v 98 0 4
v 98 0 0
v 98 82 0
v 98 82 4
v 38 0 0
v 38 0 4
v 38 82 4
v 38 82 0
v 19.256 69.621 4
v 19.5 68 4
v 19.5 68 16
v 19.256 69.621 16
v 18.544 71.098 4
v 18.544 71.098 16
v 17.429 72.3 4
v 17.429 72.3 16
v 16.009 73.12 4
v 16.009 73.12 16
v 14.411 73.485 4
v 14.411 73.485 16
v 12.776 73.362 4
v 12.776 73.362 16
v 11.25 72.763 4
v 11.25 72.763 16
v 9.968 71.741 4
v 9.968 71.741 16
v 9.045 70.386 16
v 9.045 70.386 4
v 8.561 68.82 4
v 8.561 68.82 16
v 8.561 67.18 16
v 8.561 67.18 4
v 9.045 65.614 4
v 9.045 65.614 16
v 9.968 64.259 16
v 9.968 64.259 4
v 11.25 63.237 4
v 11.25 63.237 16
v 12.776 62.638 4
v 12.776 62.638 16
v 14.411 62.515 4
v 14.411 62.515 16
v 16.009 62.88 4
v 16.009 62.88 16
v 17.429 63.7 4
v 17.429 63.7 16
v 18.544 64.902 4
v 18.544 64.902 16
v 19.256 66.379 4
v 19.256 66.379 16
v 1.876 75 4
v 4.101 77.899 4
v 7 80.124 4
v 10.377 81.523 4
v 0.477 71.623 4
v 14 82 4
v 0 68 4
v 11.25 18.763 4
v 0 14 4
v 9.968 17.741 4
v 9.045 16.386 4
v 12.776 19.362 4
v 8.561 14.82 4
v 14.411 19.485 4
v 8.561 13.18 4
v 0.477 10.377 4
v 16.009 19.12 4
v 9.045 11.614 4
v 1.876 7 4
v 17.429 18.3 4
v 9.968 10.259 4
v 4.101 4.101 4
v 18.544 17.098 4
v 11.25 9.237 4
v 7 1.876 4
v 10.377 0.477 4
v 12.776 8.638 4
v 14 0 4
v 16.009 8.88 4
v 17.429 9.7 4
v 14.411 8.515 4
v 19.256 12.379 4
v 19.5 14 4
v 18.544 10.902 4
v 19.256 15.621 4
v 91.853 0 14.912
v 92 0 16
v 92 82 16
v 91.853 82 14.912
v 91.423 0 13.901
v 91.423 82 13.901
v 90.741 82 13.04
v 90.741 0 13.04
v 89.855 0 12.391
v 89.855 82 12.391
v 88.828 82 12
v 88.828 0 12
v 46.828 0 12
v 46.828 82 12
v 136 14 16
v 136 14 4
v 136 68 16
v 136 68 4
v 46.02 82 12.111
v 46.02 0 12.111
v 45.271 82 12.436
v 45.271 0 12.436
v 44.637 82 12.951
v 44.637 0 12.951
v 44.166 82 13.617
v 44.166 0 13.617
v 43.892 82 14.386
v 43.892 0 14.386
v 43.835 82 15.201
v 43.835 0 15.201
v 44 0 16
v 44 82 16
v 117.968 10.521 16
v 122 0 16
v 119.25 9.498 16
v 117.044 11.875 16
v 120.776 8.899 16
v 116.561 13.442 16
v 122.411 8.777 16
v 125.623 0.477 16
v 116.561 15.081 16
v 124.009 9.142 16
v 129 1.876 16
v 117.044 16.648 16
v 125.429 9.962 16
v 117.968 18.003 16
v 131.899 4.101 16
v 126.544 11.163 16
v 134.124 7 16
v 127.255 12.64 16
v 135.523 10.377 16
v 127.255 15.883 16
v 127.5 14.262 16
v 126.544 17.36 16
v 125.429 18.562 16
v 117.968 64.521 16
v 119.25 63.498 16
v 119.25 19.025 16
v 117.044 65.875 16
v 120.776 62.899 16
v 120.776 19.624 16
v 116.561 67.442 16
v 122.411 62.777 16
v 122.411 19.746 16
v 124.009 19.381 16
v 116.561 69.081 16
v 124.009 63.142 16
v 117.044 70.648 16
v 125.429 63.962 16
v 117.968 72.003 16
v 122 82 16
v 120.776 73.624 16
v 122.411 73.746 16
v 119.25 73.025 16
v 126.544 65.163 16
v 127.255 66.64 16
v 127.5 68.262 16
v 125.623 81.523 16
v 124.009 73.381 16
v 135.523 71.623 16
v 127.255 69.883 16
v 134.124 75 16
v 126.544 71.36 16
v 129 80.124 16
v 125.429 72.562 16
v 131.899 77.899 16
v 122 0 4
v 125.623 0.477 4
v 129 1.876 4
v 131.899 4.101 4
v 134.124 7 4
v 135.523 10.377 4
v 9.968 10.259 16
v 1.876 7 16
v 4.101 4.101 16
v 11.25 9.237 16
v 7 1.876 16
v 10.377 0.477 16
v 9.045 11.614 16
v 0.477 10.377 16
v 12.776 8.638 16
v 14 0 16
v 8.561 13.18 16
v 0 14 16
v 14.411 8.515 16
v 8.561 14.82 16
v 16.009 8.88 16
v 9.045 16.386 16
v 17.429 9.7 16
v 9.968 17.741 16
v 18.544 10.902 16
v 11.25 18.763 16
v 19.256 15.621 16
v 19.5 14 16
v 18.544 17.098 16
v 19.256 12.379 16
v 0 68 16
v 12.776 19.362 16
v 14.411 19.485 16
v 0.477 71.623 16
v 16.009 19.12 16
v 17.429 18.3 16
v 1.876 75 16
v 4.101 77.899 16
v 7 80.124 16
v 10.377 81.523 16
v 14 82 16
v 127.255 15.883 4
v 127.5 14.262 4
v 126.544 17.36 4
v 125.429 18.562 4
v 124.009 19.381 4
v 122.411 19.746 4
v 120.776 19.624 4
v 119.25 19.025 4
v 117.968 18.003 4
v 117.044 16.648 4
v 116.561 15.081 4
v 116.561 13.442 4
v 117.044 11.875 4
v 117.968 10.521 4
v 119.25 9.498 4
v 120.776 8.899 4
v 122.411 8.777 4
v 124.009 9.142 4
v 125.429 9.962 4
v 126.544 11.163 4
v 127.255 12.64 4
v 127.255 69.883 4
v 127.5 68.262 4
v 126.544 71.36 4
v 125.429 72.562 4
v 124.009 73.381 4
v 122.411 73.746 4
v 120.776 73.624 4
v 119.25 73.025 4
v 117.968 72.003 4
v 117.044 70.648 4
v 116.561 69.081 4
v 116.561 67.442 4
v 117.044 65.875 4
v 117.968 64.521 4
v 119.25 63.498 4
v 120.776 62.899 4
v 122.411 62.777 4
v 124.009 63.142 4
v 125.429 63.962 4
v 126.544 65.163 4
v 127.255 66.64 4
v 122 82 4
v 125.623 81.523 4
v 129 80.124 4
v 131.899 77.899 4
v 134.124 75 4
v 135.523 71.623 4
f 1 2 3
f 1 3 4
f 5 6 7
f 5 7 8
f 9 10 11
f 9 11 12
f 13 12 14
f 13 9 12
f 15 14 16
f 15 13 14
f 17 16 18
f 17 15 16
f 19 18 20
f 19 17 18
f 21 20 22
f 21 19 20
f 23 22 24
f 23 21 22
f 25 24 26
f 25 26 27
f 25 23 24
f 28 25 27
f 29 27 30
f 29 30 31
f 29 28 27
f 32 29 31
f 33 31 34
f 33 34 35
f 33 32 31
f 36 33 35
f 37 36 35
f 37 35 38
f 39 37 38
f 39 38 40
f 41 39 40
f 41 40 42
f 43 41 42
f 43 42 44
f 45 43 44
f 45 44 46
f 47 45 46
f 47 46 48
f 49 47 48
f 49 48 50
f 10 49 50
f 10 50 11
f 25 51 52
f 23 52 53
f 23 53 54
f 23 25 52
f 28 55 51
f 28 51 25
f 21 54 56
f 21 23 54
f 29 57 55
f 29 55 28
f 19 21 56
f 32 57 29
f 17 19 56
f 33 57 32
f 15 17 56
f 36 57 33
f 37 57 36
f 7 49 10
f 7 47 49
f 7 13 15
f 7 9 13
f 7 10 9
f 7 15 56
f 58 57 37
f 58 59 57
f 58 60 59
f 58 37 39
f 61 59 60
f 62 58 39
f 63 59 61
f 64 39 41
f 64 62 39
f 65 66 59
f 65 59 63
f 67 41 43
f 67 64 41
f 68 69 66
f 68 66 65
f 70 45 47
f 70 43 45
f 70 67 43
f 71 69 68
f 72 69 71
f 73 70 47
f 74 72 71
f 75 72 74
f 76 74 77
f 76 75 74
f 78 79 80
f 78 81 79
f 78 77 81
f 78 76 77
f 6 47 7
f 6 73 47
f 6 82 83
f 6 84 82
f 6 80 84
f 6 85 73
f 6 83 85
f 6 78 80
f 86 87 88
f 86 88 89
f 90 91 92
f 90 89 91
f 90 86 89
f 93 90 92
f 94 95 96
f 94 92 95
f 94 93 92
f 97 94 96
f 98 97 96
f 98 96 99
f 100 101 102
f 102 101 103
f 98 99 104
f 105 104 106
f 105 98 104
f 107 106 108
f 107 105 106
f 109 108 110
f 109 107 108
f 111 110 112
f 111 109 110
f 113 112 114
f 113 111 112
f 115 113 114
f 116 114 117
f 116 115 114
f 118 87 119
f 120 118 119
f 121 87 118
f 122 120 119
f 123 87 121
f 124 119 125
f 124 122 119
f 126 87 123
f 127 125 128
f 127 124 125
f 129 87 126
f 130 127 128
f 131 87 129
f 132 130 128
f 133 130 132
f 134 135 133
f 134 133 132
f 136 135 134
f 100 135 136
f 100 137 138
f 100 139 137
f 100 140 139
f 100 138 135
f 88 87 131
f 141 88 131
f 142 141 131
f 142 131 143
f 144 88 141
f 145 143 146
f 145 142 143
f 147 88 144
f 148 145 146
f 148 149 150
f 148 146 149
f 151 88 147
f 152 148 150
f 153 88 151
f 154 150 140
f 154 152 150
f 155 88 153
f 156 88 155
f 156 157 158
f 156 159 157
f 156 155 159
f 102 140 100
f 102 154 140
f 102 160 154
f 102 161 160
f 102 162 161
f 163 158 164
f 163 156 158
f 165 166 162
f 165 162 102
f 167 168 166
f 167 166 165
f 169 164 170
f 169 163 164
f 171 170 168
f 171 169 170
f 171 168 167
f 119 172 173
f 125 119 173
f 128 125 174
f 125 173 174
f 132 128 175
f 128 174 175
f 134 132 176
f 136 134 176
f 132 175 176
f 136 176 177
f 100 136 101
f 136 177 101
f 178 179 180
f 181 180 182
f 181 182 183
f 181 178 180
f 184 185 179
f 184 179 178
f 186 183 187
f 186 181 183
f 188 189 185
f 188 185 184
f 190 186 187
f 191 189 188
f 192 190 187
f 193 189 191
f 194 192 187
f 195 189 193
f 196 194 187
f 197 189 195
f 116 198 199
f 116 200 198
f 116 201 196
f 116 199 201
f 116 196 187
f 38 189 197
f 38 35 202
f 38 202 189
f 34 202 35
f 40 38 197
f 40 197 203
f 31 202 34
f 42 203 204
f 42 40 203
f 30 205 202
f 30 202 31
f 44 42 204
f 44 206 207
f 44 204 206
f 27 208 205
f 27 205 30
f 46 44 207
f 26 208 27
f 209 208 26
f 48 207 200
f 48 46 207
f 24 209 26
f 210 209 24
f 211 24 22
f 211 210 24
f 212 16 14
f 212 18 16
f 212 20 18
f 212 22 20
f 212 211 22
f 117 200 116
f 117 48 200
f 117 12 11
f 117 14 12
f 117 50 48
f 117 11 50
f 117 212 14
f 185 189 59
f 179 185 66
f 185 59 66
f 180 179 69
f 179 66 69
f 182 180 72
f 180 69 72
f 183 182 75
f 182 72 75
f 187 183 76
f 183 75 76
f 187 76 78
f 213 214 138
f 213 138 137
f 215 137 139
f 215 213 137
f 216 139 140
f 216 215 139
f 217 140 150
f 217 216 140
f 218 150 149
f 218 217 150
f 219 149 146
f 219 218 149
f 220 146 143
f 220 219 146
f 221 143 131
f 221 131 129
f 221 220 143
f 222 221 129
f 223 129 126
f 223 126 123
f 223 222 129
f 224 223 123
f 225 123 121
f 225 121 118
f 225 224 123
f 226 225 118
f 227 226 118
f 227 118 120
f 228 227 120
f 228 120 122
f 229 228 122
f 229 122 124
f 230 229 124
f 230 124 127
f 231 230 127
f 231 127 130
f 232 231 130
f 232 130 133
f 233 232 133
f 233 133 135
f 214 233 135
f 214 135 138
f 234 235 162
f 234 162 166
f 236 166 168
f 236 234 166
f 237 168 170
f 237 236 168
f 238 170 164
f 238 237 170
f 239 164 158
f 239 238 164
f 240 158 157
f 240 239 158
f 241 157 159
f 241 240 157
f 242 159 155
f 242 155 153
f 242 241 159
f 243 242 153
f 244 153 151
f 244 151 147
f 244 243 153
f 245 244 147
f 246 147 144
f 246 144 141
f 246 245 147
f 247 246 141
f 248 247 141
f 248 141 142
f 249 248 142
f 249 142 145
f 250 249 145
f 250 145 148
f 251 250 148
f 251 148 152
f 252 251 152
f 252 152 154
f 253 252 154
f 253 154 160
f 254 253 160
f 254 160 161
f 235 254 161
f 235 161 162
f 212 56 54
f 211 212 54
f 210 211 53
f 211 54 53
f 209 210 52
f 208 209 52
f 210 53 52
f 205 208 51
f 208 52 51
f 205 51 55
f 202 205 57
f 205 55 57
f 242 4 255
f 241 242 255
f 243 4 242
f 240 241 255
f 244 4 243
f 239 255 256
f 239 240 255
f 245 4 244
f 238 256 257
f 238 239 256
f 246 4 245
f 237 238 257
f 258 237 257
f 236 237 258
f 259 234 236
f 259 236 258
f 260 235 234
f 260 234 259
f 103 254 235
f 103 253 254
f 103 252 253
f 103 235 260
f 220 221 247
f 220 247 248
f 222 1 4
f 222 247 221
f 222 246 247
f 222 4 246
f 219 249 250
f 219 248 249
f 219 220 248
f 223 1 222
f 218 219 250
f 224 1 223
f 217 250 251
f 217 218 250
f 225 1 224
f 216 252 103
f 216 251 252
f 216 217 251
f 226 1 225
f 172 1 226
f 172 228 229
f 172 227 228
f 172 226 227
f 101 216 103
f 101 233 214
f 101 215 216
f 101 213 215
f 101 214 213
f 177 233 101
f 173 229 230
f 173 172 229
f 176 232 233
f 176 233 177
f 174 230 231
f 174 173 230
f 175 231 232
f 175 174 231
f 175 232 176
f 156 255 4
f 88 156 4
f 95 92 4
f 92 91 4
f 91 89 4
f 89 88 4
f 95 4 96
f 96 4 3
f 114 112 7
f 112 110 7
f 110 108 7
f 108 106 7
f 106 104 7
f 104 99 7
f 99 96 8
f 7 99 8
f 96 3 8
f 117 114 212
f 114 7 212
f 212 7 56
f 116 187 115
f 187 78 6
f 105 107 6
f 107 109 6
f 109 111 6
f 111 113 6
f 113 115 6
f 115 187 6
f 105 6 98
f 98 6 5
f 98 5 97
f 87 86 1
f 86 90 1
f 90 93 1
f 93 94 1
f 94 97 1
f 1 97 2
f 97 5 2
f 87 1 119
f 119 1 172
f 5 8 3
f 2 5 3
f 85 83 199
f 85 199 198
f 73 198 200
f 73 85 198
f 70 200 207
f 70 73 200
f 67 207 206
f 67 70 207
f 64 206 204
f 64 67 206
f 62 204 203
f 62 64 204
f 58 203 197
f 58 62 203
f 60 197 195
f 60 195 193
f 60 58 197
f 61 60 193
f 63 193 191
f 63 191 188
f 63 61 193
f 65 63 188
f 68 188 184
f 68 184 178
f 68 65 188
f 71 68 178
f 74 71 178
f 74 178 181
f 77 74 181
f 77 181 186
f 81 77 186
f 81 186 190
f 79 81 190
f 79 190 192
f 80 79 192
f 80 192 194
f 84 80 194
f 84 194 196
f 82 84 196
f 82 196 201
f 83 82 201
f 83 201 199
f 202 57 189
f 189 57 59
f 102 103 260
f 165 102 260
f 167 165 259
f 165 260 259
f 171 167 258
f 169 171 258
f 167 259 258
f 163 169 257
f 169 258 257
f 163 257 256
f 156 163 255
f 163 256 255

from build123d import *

# Parameters (mm, degrees)
F0_R     = 5.5
F0_W     = 48
F0_H     = 82
F1_DEPTH = 16
F3_DEPTH = 82.001


with BuildPart() as f1:
    # F0 (on Top) → F1 (new body)
    with BuildSketch(Plane.XY):
        with BuildLine():
            Line((0, 68), (0, 14))
            ThreePointArc((0, 14), (4.100505, 4.100505), (14, 0))
            Line((14, 0), (44, 0))
            Line((44, 0), (44, 82))
            Line((44, 82), (14, 82))
            ThreePointArc((14, 82), (4.100505, 77.899495), (0, 68))
        make_face()
        with Locations((14, 14)):
            Circle(F0_R, mode=Mode.SUBTRACT)
        with Locations((14, 68)):
            Circle(F0_R, mode=Mode.SUBTRACT)
        with Locations((68, 41)):
            Rectangle(F0_W, F0_H)
        with BuildLine():
            Line((92, 82), (92, 0))
            Line((92, 0), (122, 0))
            ThreePointArc((122, 0), (131.899495, 4.100505), (136, 14))
            Line((136, 14), (136, 68))
            ThreePointArc((136, 68), (131.899495, 77.899495), (122, 82))
            Line((122, 82), (92, 82))
        make_face()
        with Locations((121.999683, 14.261592)):
            Circle(F0_R, mode=Mode.SUBTRACT)
        with Locations((121.999683, 68.261592)):
            Circle(F0_R, mode=Mode.SUBTRACT)
    extrude(amount=F1_DEPTH)

    # F2 (on Front) → F3 (intersect, through all)
    with BuildSketch(Plane.XZ):
        with BuildLine():
            Line((0, 16), (0, 4))
            Line((0, 4), (38, 4))
            Line((38, 4), (38, 0))
            Line((38, 0), (98, 0))
            Line((98, 0), (98, 4))
            Line((98, 4), (136, 4))
            Line((136, 4), (136, 16))
            Line((136, 16), (92, 16))
            ThreePointArc((92, 16), (91.110896, 13.447605), (88.828427, 12))
            Line((88.828427, 12), (46.828427, 12))
            ThreePointArc((46.828427, 12), (44.378937, 13.267949), (44, 16))
            Line((44, 16), (0, 16))
        make_face()
    extrude(amount=-F3_DEPTH, mode=Mode.INTERSECT)


solid = f1.part
